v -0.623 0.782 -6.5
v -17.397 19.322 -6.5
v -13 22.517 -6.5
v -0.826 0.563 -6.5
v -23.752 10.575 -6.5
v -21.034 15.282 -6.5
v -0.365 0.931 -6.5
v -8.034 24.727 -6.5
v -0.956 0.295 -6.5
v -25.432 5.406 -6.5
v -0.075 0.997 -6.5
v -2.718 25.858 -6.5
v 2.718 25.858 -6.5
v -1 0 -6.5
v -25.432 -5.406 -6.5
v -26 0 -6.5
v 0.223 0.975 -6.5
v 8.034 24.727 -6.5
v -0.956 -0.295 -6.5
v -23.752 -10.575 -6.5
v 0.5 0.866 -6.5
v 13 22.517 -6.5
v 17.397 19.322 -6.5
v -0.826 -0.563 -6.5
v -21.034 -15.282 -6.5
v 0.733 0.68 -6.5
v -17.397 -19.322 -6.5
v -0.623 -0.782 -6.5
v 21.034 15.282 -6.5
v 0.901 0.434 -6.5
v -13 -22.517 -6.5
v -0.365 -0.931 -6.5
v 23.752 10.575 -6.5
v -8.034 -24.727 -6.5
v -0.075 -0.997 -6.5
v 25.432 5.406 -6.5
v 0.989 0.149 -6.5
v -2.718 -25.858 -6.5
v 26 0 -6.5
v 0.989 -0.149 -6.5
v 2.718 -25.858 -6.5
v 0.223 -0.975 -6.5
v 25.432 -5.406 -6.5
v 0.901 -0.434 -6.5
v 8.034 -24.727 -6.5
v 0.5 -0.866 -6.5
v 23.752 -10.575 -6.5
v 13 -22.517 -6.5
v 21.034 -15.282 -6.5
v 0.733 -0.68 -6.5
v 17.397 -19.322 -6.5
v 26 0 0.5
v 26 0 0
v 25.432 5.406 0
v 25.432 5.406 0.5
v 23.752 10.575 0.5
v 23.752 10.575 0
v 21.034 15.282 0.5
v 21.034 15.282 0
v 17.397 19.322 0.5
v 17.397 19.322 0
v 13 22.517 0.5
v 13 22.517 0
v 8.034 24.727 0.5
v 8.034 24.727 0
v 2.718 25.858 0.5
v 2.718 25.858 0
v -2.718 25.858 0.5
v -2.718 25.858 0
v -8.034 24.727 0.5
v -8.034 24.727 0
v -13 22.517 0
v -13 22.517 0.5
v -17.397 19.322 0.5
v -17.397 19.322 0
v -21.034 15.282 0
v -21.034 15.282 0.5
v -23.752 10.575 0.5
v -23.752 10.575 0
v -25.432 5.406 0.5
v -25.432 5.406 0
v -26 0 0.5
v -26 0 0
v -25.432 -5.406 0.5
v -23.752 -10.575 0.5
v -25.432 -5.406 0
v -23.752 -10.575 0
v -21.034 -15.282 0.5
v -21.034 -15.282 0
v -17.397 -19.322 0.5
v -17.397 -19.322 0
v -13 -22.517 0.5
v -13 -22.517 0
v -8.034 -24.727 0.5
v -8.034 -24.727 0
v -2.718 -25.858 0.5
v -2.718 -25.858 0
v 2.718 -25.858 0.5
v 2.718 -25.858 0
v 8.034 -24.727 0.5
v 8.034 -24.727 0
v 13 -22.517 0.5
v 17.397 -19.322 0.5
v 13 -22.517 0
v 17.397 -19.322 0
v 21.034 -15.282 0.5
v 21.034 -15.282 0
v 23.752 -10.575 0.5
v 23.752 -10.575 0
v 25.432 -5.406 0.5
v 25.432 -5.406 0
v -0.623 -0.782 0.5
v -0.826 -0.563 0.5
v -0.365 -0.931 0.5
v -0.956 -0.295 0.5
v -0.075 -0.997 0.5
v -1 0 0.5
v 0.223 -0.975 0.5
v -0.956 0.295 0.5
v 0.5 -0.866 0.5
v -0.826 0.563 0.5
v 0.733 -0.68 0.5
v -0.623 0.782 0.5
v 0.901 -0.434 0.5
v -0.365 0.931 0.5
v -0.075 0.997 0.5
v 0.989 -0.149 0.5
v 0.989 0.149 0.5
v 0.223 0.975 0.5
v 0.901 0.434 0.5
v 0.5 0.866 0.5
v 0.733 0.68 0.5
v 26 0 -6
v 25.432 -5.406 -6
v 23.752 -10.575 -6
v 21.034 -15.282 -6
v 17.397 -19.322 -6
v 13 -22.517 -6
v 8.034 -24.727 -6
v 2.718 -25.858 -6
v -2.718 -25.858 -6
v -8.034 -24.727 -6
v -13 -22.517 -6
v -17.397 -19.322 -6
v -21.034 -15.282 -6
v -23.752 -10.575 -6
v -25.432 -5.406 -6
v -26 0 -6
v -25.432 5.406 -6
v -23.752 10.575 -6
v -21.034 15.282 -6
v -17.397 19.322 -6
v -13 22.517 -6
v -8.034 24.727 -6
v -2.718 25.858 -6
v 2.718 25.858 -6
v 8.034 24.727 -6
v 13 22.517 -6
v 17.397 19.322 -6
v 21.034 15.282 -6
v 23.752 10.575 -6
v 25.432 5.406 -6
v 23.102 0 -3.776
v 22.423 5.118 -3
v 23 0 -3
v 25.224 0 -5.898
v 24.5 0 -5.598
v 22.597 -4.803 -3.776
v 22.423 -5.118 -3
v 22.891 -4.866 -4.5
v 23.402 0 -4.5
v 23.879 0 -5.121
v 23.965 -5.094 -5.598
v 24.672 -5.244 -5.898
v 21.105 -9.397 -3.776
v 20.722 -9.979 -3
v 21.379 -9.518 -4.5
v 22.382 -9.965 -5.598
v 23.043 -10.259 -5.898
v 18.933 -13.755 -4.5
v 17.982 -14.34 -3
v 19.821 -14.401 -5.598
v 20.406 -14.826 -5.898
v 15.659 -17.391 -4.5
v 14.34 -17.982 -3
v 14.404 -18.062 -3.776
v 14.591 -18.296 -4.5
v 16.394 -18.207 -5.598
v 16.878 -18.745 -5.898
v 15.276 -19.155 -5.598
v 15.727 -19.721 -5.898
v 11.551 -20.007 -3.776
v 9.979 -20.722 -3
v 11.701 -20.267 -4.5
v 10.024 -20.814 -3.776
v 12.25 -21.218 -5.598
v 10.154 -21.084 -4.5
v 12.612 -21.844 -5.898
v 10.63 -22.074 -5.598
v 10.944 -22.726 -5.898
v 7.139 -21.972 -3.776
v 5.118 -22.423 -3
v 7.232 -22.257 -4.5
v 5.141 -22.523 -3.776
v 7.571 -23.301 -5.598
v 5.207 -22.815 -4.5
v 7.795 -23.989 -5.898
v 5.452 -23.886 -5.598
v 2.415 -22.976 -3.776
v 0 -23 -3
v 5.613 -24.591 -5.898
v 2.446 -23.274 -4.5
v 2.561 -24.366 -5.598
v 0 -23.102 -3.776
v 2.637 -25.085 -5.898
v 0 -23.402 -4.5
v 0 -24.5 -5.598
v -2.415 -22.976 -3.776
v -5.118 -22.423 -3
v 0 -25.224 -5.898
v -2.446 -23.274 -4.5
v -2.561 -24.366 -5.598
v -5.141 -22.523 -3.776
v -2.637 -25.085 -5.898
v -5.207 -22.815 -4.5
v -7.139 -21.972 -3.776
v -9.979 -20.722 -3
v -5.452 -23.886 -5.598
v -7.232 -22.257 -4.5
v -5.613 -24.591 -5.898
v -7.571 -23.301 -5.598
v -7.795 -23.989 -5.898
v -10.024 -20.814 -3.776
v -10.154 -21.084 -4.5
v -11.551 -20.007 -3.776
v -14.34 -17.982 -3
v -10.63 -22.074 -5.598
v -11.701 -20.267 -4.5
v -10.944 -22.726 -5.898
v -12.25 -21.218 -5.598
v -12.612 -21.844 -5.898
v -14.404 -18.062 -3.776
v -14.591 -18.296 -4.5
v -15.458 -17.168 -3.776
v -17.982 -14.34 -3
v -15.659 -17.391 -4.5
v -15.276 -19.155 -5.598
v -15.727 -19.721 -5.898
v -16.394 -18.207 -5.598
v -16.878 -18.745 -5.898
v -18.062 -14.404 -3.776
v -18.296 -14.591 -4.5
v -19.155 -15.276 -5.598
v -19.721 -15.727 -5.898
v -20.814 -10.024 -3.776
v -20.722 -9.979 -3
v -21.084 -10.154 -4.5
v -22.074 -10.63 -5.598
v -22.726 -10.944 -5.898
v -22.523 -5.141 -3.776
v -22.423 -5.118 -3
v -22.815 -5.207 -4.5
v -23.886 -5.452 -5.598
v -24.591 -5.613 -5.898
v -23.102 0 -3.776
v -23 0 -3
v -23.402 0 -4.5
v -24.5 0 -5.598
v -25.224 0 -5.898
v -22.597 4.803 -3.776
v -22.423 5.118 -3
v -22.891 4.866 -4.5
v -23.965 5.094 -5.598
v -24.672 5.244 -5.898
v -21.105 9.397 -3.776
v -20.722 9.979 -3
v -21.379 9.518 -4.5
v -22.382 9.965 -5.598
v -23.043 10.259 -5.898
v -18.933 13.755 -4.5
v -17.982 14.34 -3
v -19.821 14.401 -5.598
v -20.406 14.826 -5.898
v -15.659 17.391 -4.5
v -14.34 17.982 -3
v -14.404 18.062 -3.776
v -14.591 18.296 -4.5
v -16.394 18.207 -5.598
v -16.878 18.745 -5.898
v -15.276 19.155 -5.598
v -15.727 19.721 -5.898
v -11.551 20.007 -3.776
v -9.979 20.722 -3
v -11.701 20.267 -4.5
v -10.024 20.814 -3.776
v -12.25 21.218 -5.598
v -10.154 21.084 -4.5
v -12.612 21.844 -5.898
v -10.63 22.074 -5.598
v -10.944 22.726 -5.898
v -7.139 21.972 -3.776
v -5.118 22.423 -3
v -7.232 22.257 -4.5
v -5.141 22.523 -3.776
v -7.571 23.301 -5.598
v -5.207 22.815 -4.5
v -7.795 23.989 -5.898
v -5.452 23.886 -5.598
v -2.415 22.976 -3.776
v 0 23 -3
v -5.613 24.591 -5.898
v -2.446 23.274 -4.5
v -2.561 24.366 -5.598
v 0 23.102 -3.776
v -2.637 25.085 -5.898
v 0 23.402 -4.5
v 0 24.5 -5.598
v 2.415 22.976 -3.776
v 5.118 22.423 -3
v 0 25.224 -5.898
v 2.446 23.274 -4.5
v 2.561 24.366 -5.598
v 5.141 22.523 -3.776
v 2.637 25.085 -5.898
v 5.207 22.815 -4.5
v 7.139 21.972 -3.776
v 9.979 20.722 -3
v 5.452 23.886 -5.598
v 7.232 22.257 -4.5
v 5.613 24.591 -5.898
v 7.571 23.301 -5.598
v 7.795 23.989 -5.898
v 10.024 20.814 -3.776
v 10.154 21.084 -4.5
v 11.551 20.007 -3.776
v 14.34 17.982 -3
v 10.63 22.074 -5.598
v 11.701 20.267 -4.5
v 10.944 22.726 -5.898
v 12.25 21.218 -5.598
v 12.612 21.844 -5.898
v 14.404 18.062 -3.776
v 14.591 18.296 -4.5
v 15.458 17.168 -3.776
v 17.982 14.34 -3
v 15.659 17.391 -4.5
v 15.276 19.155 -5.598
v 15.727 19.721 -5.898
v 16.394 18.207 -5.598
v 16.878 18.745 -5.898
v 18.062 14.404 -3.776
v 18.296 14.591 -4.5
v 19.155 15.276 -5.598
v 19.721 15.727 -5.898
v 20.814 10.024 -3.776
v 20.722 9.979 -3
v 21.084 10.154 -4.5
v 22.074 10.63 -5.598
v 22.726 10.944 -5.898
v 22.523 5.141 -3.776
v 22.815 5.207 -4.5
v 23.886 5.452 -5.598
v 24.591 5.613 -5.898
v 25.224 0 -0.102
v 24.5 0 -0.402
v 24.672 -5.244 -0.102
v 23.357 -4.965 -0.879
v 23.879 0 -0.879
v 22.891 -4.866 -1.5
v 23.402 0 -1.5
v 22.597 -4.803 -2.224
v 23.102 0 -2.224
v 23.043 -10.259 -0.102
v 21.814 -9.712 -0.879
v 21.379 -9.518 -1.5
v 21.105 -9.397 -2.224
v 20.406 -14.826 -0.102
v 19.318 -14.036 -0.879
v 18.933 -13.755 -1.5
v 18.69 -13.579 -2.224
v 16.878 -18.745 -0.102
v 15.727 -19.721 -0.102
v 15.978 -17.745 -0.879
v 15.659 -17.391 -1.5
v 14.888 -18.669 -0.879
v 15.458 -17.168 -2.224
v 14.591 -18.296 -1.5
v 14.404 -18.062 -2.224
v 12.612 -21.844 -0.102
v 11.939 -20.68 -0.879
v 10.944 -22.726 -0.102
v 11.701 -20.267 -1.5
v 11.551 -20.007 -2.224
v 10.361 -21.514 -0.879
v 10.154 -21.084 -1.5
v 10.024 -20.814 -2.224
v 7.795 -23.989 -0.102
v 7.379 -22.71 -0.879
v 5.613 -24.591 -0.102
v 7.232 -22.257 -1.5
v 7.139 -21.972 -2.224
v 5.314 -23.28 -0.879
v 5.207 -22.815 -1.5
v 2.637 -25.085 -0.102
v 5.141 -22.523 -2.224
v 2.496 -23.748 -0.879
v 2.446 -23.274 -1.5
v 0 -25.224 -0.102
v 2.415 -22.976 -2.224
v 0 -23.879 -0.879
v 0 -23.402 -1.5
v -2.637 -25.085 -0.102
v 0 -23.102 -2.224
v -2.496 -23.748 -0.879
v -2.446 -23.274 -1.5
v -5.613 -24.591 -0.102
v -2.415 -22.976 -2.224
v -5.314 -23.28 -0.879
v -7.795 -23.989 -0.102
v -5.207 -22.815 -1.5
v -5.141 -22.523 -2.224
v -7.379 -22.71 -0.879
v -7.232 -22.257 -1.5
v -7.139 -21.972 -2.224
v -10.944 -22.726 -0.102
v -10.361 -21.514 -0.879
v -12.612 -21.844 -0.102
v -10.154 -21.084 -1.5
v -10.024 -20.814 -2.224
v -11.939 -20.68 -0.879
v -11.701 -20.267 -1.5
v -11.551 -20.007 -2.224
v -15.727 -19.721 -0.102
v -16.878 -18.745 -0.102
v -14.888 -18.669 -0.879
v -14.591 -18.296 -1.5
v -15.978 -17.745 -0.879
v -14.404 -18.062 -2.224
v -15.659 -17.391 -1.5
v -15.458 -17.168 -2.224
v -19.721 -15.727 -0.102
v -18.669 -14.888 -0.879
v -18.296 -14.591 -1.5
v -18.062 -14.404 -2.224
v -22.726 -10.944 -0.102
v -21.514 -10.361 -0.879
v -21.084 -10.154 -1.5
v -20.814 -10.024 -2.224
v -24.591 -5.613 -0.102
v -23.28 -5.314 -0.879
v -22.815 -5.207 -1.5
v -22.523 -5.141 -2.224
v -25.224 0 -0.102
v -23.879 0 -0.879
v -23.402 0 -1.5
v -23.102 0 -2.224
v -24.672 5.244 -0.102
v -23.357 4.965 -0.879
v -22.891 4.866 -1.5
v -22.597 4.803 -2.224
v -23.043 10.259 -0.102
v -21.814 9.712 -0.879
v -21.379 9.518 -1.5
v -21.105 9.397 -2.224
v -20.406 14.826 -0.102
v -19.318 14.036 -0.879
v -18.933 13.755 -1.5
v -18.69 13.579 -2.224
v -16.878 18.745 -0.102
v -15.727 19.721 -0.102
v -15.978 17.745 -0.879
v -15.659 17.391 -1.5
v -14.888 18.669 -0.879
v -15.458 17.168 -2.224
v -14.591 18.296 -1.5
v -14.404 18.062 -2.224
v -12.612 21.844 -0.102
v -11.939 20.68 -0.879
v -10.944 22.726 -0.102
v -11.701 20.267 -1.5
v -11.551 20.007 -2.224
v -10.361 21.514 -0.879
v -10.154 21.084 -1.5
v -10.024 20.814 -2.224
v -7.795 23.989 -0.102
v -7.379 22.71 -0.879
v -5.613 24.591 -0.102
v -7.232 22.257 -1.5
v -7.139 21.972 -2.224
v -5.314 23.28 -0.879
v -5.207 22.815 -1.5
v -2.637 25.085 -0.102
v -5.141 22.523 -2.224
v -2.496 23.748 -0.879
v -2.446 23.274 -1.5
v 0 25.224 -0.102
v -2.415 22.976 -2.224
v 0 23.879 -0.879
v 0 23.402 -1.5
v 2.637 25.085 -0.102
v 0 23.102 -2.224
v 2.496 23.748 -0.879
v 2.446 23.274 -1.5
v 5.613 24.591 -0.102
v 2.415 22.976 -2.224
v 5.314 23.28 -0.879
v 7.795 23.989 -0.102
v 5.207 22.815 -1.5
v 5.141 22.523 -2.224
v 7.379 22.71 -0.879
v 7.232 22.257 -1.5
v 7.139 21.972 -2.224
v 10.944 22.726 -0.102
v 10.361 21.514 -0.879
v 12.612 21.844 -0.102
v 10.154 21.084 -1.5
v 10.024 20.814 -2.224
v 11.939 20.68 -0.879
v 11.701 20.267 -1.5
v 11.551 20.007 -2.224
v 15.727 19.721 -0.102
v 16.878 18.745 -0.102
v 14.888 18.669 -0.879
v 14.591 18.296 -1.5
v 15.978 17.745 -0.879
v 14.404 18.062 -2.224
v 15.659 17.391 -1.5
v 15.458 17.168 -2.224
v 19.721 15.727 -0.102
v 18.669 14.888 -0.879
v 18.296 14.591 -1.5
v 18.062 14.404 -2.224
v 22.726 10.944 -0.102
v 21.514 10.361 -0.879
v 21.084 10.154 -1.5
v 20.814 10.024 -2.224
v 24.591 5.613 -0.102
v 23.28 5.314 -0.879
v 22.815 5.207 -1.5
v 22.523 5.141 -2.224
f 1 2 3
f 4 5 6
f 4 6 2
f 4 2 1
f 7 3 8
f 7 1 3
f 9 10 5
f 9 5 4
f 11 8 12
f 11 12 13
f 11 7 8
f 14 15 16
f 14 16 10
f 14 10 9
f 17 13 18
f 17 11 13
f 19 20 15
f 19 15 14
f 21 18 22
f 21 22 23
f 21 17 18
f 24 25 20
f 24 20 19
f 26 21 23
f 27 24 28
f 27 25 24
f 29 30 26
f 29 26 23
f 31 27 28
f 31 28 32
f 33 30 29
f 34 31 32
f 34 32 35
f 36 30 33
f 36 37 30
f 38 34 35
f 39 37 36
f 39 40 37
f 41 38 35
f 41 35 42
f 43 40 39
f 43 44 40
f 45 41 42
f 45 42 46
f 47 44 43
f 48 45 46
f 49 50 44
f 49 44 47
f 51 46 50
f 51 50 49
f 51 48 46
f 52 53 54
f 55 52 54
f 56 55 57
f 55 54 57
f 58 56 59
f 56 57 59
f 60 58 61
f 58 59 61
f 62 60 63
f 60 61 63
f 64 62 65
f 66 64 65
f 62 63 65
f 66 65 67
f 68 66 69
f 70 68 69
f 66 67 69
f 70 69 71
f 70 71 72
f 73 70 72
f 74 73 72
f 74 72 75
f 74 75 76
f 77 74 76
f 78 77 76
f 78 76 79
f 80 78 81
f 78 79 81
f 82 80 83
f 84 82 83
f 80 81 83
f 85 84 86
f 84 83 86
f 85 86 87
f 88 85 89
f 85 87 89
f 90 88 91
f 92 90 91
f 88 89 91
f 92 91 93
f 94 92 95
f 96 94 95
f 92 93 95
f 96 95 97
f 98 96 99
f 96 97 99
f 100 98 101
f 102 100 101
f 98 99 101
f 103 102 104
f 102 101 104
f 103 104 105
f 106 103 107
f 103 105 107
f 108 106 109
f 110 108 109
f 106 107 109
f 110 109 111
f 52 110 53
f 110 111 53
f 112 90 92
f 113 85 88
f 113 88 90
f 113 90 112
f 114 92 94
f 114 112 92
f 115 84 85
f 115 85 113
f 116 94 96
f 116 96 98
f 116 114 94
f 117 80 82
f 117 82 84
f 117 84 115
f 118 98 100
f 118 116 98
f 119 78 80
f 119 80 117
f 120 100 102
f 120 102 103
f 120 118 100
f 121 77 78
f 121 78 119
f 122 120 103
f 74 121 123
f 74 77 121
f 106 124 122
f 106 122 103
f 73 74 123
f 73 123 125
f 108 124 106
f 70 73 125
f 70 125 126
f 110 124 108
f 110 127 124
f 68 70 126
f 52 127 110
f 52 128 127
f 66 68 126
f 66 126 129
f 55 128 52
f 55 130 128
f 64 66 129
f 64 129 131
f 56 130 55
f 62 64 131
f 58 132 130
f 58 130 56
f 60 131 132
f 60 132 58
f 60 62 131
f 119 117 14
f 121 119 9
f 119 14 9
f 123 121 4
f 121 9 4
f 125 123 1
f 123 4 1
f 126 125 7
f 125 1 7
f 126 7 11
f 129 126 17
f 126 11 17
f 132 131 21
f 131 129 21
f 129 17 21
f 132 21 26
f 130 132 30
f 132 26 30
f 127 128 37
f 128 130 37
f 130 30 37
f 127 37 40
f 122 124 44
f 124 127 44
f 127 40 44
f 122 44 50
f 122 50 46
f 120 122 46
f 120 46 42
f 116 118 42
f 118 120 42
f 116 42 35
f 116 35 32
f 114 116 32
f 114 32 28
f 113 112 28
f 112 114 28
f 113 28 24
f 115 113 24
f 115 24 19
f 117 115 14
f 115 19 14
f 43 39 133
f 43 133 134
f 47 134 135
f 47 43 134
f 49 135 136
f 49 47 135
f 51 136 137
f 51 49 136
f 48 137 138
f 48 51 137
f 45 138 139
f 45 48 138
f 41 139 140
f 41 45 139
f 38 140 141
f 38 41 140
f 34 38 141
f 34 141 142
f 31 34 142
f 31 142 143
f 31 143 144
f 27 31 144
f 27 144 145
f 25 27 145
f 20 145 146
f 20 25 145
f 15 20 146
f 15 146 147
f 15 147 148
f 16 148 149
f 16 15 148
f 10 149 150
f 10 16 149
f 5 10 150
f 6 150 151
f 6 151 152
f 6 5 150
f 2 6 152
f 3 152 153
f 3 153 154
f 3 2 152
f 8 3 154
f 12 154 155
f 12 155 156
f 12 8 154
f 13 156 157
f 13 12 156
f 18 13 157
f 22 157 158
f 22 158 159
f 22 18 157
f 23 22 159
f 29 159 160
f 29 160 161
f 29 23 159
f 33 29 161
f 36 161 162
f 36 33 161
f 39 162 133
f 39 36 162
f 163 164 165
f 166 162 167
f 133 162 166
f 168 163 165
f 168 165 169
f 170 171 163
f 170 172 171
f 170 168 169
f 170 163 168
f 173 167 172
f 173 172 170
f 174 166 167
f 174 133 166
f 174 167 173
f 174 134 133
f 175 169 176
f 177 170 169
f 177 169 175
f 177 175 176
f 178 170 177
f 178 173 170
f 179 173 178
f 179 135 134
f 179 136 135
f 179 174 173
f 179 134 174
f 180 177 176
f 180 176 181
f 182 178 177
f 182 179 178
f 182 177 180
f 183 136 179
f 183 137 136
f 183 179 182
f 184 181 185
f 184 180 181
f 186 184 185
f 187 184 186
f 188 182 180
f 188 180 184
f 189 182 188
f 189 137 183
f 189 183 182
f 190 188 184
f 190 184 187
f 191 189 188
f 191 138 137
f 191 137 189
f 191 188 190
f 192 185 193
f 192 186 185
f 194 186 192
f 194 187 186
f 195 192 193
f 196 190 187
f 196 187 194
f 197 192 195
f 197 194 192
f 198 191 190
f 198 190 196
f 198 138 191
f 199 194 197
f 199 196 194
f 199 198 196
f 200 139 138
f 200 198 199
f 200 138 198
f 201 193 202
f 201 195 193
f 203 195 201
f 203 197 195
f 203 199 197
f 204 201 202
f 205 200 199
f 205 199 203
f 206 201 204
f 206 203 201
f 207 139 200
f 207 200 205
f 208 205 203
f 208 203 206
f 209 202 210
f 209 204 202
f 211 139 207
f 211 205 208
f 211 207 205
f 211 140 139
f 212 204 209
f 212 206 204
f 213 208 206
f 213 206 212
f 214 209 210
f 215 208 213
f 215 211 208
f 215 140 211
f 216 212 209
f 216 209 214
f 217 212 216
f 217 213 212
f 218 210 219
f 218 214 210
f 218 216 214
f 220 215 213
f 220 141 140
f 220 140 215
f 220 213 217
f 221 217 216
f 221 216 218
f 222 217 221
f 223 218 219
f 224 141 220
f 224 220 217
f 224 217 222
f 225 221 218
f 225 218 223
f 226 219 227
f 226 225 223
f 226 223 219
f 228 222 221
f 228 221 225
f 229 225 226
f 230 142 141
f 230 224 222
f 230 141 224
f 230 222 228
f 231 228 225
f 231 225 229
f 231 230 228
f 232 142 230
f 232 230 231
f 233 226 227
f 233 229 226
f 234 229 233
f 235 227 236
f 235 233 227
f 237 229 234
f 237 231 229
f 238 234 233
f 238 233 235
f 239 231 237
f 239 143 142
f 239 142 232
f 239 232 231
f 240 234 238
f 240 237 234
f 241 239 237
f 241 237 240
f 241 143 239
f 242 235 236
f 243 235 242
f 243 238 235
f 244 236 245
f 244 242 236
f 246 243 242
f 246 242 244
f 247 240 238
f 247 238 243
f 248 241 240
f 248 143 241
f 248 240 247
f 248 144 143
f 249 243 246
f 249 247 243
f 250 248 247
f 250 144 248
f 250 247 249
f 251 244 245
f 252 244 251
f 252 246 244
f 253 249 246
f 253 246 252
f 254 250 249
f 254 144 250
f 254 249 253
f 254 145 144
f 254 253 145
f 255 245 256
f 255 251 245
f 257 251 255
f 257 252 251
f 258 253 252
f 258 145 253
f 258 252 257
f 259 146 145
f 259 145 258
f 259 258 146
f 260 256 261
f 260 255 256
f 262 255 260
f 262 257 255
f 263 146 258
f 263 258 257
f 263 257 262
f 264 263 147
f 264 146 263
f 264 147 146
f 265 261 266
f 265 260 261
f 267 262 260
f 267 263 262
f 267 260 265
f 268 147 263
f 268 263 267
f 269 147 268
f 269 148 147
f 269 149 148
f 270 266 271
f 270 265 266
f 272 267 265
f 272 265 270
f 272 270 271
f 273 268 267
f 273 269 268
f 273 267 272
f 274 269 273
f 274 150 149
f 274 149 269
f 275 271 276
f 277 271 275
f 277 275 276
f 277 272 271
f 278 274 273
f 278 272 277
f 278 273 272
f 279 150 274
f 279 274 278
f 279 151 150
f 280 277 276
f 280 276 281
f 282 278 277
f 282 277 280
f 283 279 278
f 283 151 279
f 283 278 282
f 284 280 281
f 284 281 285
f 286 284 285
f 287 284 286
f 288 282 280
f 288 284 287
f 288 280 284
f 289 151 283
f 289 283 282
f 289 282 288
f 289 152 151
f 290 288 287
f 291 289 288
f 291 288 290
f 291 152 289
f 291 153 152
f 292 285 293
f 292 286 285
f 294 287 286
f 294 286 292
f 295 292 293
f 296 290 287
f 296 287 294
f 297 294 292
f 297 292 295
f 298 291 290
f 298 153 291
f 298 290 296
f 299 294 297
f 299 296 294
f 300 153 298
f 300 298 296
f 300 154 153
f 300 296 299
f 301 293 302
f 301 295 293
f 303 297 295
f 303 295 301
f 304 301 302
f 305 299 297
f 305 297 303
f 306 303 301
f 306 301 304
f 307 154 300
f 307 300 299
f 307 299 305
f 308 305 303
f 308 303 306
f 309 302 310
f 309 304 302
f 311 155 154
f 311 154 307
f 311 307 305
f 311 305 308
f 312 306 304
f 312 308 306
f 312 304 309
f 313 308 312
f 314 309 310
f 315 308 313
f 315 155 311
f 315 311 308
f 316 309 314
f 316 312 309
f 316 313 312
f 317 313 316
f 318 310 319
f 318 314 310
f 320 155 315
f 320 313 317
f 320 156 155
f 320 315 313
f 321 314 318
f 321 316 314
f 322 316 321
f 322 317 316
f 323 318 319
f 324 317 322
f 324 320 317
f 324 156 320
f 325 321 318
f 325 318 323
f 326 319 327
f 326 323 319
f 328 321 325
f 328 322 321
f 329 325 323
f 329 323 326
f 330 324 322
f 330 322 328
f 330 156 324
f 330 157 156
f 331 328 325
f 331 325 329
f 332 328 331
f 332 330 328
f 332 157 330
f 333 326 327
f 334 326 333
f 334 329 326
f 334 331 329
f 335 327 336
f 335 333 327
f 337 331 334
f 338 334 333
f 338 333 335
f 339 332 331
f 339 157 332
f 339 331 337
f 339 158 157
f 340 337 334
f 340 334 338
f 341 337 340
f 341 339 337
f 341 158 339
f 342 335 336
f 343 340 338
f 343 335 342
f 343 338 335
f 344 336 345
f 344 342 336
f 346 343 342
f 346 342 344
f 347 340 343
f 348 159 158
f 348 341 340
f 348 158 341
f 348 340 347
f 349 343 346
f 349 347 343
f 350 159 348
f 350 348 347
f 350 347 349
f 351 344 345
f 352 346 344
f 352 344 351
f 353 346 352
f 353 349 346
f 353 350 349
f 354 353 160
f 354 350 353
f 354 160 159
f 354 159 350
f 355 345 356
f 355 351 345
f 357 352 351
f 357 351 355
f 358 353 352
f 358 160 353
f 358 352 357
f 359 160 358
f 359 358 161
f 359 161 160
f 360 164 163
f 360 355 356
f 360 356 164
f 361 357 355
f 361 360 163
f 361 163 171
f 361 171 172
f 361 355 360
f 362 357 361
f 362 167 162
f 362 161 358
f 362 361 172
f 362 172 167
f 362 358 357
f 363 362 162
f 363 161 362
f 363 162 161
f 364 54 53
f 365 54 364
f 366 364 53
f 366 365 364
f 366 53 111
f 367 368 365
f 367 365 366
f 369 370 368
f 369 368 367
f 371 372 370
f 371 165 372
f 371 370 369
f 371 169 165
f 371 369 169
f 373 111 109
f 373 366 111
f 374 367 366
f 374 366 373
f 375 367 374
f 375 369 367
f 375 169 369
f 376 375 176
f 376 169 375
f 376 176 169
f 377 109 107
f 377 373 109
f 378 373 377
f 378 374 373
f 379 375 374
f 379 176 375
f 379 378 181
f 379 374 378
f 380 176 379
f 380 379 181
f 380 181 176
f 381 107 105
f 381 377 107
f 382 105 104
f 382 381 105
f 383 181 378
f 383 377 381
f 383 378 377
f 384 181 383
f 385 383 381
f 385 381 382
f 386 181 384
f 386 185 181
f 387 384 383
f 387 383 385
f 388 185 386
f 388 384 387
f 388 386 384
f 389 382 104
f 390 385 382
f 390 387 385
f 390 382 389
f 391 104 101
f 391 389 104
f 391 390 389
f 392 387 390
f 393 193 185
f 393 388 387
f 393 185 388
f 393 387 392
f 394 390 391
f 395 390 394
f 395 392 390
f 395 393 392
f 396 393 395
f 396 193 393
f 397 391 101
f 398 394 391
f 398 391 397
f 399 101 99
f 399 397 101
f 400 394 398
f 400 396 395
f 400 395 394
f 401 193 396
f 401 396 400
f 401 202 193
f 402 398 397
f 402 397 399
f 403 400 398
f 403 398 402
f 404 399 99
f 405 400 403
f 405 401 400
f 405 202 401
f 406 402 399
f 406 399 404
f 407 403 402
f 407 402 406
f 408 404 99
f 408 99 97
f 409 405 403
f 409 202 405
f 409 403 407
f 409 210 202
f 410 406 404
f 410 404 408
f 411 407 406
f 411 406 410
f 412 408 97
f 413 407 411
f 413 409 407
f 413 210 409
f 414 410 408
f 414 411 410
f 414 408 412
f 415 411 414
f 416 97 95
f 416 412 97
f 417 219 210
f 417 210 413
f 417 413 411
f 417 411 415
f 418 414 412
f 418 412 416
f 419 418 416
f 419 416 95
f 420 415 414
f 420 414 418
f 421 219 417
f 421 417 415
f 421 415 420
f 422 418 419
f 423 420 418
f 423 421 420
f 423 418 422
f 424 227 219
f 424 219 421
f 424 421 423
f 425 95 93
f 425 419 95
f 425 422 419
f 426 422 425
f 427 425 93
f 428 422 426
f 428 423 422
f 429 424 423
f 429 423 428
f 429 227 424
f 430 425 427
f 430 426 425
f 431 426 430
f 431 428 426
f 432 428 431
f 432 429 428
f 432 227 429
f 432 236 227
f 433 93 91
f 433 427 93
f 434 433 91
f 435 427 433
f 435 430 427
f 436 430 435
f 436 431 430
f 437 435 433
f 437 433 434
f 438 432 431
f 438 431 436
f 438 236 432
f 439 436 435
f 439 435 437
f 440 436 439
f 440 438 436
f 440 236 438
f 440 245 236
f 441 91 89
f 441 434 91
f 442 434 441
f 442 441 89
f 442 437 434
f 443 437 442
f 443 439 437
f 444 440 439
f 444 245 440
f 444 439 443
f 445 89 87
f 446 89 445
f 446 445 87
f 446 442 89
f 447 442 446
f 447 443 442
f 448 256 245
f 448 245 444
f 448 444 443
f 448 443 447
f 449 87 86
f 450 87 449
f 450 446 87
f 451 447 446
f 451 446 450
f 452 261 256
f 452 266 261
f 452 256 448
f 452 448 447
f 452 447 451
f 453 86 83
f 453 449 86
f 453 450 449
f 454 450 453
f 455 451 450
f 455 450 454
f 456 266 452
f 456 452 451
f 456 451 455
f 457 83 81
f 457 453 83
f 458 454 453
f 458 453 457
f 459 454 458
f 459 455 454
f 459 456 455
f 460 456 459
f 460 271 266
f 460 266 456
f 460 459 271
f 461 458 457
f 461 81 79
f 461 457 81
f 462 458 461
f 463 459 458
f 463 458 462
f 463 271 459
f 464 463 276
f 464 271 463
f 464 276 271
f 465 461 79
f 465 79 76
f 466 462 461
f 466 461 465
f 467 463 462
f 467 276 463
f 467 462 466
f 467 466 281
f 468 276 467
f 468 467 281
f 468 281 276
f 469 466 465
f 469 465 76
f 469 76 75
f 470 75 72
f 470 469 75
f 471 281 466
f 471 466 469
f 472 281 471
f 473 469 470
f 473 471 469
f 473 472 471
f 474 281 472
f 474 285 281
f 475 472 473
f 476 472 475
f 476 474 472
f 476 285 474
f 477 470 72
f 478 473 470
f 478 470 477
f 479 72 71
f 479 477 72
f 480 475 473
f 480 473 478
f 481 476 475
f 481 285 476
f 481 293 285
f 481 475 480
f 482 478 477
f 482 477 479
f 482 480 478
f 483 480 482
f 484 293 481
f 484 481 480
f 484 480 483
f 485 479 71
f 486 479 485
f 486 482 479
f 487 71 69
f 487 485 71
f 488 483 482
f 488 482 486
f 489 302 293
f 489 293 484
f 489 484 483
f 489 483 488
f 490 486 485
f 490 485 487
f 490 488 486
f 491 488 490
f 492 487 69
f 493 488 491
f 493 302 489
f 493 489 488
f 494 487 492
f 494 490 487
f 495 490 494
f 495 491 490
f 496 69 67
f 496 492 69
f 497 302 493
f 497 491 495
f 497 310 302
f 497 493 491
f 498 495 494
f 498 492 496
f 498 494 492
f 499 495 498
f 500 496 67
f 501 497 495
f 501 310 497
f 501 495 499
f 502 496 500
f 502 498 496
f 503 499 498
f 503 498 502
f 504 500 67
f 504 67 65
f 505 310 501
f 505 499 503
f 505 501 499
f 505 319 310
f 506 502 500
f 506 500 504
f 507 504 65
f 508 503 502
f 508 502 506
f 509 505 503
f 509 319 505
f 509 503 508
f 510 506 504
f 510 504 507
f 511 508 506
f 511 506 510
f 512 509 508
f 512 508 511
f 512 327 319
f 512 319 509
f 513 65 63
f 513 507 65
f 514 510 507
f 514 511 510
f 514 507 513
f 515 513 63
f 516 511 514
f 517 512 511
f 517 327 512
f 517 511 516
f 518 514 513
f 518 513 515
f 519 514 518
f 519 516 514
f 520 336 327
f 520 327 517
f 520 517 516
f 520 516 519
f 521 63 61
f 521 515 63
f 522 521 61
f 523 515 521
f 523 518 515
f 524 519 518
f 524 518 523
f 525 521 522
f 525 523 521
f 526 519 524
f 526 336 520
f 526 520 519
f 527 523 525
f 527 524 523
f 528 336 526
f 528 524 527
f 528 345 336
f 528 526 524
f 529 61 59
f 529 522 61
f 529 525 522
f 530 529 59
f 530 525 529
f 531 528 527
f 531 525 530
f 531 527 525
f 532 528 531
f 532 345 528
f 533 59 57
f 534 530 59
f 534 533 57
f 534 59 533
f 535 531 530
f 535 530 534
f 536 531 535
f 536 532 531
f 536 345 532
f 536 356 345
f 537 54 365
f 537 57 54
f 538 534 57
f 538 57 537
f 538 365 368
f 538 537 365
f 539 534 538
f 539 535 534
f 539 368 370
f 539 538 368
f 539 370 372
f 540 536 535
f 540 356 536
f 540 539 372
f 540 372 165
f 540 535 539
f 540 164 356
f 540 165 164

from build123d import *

# Parameters (mm, degrees)
SKETCH1_W           = 23
SKETCH1_H           = 6
SKETCH2_R           = 26
SKETCH2_R_2         = 1
BOSS_EXTRUDE1_DEPTH = 0.5
BOSS_EXTRUDE2_START = 0.5
SKETCH3_R           = 26
BOSS_EXTRUDE2_DEPTH = 0.5
SKETCH4_R           = 1
CUT_EXTRUDE2_DEPTH  = 7


with BuildPart() as part:
    # Sketch1 → Revolve1 (revolve)
    with BuildSketch(Plane(origin=(0, 0, 0), x_dir=(1, 0, 0), z_dir=(0, 1, 0))):
        with BuildLine():
            Line((23, 6), (23, 3))
            ThreePointArc((23, 3), (23.878679656, 5.121320344), (26, 6))
            Line((26, 6), (23, 6))
        make_face()
        with BuildLine():
            Line((23, 3), (23, 0))
            Line((23, 0), (26, 0))
            ThreePointArc((26, 0), (23.878679656, 0.878679656), (23, 3))
        make_face()
        with Locations((11.5, 3)):
            Rectangle(SKETCH1_W, SKETCH1_H)
    revolve(axis=Axis((0, 0, 0), (0, 0, -1)))

    # Sketch2 → Boss-Extrude1 (add)
    with BuildSketch(Plane.XY):
        Circle(SKETCH2_R)
        Circle(SKETCH2_R_2, mode=Mode.SUBTRACT)
    extrude(amount=BOSS_EXTRUDE1_DEPTH)

    # Sketch3 → Boss-Extrude2 (add)
    with BuildSketch(Plane(origin=(0, 0, -6), x_dir=(-1, 0, 0), z_dir=(0, 0, -1)).offset(BOSS_EXTRUDE2_START)):
        with Locations(Location((0, 0, 0), (0, 0, 180))):
            Circle(SKETCH3_R)
    extrude(amount=-BOSS_EXTRUDE2_DEPTH)

    # Sketch4 → Cut-Extrude2 (cut)
    with BuildSketch(Plane(origin=(0, 0, -6.5), x_dir=(-1, 0, 0), z_dir=(0, 0, -1))):
        Circle(SKETCH4_R)
    extrude(amount=-CUT_EXTRUDE2_DEPTH, mode=Mode.SUBTRACT)


solid = part.part
